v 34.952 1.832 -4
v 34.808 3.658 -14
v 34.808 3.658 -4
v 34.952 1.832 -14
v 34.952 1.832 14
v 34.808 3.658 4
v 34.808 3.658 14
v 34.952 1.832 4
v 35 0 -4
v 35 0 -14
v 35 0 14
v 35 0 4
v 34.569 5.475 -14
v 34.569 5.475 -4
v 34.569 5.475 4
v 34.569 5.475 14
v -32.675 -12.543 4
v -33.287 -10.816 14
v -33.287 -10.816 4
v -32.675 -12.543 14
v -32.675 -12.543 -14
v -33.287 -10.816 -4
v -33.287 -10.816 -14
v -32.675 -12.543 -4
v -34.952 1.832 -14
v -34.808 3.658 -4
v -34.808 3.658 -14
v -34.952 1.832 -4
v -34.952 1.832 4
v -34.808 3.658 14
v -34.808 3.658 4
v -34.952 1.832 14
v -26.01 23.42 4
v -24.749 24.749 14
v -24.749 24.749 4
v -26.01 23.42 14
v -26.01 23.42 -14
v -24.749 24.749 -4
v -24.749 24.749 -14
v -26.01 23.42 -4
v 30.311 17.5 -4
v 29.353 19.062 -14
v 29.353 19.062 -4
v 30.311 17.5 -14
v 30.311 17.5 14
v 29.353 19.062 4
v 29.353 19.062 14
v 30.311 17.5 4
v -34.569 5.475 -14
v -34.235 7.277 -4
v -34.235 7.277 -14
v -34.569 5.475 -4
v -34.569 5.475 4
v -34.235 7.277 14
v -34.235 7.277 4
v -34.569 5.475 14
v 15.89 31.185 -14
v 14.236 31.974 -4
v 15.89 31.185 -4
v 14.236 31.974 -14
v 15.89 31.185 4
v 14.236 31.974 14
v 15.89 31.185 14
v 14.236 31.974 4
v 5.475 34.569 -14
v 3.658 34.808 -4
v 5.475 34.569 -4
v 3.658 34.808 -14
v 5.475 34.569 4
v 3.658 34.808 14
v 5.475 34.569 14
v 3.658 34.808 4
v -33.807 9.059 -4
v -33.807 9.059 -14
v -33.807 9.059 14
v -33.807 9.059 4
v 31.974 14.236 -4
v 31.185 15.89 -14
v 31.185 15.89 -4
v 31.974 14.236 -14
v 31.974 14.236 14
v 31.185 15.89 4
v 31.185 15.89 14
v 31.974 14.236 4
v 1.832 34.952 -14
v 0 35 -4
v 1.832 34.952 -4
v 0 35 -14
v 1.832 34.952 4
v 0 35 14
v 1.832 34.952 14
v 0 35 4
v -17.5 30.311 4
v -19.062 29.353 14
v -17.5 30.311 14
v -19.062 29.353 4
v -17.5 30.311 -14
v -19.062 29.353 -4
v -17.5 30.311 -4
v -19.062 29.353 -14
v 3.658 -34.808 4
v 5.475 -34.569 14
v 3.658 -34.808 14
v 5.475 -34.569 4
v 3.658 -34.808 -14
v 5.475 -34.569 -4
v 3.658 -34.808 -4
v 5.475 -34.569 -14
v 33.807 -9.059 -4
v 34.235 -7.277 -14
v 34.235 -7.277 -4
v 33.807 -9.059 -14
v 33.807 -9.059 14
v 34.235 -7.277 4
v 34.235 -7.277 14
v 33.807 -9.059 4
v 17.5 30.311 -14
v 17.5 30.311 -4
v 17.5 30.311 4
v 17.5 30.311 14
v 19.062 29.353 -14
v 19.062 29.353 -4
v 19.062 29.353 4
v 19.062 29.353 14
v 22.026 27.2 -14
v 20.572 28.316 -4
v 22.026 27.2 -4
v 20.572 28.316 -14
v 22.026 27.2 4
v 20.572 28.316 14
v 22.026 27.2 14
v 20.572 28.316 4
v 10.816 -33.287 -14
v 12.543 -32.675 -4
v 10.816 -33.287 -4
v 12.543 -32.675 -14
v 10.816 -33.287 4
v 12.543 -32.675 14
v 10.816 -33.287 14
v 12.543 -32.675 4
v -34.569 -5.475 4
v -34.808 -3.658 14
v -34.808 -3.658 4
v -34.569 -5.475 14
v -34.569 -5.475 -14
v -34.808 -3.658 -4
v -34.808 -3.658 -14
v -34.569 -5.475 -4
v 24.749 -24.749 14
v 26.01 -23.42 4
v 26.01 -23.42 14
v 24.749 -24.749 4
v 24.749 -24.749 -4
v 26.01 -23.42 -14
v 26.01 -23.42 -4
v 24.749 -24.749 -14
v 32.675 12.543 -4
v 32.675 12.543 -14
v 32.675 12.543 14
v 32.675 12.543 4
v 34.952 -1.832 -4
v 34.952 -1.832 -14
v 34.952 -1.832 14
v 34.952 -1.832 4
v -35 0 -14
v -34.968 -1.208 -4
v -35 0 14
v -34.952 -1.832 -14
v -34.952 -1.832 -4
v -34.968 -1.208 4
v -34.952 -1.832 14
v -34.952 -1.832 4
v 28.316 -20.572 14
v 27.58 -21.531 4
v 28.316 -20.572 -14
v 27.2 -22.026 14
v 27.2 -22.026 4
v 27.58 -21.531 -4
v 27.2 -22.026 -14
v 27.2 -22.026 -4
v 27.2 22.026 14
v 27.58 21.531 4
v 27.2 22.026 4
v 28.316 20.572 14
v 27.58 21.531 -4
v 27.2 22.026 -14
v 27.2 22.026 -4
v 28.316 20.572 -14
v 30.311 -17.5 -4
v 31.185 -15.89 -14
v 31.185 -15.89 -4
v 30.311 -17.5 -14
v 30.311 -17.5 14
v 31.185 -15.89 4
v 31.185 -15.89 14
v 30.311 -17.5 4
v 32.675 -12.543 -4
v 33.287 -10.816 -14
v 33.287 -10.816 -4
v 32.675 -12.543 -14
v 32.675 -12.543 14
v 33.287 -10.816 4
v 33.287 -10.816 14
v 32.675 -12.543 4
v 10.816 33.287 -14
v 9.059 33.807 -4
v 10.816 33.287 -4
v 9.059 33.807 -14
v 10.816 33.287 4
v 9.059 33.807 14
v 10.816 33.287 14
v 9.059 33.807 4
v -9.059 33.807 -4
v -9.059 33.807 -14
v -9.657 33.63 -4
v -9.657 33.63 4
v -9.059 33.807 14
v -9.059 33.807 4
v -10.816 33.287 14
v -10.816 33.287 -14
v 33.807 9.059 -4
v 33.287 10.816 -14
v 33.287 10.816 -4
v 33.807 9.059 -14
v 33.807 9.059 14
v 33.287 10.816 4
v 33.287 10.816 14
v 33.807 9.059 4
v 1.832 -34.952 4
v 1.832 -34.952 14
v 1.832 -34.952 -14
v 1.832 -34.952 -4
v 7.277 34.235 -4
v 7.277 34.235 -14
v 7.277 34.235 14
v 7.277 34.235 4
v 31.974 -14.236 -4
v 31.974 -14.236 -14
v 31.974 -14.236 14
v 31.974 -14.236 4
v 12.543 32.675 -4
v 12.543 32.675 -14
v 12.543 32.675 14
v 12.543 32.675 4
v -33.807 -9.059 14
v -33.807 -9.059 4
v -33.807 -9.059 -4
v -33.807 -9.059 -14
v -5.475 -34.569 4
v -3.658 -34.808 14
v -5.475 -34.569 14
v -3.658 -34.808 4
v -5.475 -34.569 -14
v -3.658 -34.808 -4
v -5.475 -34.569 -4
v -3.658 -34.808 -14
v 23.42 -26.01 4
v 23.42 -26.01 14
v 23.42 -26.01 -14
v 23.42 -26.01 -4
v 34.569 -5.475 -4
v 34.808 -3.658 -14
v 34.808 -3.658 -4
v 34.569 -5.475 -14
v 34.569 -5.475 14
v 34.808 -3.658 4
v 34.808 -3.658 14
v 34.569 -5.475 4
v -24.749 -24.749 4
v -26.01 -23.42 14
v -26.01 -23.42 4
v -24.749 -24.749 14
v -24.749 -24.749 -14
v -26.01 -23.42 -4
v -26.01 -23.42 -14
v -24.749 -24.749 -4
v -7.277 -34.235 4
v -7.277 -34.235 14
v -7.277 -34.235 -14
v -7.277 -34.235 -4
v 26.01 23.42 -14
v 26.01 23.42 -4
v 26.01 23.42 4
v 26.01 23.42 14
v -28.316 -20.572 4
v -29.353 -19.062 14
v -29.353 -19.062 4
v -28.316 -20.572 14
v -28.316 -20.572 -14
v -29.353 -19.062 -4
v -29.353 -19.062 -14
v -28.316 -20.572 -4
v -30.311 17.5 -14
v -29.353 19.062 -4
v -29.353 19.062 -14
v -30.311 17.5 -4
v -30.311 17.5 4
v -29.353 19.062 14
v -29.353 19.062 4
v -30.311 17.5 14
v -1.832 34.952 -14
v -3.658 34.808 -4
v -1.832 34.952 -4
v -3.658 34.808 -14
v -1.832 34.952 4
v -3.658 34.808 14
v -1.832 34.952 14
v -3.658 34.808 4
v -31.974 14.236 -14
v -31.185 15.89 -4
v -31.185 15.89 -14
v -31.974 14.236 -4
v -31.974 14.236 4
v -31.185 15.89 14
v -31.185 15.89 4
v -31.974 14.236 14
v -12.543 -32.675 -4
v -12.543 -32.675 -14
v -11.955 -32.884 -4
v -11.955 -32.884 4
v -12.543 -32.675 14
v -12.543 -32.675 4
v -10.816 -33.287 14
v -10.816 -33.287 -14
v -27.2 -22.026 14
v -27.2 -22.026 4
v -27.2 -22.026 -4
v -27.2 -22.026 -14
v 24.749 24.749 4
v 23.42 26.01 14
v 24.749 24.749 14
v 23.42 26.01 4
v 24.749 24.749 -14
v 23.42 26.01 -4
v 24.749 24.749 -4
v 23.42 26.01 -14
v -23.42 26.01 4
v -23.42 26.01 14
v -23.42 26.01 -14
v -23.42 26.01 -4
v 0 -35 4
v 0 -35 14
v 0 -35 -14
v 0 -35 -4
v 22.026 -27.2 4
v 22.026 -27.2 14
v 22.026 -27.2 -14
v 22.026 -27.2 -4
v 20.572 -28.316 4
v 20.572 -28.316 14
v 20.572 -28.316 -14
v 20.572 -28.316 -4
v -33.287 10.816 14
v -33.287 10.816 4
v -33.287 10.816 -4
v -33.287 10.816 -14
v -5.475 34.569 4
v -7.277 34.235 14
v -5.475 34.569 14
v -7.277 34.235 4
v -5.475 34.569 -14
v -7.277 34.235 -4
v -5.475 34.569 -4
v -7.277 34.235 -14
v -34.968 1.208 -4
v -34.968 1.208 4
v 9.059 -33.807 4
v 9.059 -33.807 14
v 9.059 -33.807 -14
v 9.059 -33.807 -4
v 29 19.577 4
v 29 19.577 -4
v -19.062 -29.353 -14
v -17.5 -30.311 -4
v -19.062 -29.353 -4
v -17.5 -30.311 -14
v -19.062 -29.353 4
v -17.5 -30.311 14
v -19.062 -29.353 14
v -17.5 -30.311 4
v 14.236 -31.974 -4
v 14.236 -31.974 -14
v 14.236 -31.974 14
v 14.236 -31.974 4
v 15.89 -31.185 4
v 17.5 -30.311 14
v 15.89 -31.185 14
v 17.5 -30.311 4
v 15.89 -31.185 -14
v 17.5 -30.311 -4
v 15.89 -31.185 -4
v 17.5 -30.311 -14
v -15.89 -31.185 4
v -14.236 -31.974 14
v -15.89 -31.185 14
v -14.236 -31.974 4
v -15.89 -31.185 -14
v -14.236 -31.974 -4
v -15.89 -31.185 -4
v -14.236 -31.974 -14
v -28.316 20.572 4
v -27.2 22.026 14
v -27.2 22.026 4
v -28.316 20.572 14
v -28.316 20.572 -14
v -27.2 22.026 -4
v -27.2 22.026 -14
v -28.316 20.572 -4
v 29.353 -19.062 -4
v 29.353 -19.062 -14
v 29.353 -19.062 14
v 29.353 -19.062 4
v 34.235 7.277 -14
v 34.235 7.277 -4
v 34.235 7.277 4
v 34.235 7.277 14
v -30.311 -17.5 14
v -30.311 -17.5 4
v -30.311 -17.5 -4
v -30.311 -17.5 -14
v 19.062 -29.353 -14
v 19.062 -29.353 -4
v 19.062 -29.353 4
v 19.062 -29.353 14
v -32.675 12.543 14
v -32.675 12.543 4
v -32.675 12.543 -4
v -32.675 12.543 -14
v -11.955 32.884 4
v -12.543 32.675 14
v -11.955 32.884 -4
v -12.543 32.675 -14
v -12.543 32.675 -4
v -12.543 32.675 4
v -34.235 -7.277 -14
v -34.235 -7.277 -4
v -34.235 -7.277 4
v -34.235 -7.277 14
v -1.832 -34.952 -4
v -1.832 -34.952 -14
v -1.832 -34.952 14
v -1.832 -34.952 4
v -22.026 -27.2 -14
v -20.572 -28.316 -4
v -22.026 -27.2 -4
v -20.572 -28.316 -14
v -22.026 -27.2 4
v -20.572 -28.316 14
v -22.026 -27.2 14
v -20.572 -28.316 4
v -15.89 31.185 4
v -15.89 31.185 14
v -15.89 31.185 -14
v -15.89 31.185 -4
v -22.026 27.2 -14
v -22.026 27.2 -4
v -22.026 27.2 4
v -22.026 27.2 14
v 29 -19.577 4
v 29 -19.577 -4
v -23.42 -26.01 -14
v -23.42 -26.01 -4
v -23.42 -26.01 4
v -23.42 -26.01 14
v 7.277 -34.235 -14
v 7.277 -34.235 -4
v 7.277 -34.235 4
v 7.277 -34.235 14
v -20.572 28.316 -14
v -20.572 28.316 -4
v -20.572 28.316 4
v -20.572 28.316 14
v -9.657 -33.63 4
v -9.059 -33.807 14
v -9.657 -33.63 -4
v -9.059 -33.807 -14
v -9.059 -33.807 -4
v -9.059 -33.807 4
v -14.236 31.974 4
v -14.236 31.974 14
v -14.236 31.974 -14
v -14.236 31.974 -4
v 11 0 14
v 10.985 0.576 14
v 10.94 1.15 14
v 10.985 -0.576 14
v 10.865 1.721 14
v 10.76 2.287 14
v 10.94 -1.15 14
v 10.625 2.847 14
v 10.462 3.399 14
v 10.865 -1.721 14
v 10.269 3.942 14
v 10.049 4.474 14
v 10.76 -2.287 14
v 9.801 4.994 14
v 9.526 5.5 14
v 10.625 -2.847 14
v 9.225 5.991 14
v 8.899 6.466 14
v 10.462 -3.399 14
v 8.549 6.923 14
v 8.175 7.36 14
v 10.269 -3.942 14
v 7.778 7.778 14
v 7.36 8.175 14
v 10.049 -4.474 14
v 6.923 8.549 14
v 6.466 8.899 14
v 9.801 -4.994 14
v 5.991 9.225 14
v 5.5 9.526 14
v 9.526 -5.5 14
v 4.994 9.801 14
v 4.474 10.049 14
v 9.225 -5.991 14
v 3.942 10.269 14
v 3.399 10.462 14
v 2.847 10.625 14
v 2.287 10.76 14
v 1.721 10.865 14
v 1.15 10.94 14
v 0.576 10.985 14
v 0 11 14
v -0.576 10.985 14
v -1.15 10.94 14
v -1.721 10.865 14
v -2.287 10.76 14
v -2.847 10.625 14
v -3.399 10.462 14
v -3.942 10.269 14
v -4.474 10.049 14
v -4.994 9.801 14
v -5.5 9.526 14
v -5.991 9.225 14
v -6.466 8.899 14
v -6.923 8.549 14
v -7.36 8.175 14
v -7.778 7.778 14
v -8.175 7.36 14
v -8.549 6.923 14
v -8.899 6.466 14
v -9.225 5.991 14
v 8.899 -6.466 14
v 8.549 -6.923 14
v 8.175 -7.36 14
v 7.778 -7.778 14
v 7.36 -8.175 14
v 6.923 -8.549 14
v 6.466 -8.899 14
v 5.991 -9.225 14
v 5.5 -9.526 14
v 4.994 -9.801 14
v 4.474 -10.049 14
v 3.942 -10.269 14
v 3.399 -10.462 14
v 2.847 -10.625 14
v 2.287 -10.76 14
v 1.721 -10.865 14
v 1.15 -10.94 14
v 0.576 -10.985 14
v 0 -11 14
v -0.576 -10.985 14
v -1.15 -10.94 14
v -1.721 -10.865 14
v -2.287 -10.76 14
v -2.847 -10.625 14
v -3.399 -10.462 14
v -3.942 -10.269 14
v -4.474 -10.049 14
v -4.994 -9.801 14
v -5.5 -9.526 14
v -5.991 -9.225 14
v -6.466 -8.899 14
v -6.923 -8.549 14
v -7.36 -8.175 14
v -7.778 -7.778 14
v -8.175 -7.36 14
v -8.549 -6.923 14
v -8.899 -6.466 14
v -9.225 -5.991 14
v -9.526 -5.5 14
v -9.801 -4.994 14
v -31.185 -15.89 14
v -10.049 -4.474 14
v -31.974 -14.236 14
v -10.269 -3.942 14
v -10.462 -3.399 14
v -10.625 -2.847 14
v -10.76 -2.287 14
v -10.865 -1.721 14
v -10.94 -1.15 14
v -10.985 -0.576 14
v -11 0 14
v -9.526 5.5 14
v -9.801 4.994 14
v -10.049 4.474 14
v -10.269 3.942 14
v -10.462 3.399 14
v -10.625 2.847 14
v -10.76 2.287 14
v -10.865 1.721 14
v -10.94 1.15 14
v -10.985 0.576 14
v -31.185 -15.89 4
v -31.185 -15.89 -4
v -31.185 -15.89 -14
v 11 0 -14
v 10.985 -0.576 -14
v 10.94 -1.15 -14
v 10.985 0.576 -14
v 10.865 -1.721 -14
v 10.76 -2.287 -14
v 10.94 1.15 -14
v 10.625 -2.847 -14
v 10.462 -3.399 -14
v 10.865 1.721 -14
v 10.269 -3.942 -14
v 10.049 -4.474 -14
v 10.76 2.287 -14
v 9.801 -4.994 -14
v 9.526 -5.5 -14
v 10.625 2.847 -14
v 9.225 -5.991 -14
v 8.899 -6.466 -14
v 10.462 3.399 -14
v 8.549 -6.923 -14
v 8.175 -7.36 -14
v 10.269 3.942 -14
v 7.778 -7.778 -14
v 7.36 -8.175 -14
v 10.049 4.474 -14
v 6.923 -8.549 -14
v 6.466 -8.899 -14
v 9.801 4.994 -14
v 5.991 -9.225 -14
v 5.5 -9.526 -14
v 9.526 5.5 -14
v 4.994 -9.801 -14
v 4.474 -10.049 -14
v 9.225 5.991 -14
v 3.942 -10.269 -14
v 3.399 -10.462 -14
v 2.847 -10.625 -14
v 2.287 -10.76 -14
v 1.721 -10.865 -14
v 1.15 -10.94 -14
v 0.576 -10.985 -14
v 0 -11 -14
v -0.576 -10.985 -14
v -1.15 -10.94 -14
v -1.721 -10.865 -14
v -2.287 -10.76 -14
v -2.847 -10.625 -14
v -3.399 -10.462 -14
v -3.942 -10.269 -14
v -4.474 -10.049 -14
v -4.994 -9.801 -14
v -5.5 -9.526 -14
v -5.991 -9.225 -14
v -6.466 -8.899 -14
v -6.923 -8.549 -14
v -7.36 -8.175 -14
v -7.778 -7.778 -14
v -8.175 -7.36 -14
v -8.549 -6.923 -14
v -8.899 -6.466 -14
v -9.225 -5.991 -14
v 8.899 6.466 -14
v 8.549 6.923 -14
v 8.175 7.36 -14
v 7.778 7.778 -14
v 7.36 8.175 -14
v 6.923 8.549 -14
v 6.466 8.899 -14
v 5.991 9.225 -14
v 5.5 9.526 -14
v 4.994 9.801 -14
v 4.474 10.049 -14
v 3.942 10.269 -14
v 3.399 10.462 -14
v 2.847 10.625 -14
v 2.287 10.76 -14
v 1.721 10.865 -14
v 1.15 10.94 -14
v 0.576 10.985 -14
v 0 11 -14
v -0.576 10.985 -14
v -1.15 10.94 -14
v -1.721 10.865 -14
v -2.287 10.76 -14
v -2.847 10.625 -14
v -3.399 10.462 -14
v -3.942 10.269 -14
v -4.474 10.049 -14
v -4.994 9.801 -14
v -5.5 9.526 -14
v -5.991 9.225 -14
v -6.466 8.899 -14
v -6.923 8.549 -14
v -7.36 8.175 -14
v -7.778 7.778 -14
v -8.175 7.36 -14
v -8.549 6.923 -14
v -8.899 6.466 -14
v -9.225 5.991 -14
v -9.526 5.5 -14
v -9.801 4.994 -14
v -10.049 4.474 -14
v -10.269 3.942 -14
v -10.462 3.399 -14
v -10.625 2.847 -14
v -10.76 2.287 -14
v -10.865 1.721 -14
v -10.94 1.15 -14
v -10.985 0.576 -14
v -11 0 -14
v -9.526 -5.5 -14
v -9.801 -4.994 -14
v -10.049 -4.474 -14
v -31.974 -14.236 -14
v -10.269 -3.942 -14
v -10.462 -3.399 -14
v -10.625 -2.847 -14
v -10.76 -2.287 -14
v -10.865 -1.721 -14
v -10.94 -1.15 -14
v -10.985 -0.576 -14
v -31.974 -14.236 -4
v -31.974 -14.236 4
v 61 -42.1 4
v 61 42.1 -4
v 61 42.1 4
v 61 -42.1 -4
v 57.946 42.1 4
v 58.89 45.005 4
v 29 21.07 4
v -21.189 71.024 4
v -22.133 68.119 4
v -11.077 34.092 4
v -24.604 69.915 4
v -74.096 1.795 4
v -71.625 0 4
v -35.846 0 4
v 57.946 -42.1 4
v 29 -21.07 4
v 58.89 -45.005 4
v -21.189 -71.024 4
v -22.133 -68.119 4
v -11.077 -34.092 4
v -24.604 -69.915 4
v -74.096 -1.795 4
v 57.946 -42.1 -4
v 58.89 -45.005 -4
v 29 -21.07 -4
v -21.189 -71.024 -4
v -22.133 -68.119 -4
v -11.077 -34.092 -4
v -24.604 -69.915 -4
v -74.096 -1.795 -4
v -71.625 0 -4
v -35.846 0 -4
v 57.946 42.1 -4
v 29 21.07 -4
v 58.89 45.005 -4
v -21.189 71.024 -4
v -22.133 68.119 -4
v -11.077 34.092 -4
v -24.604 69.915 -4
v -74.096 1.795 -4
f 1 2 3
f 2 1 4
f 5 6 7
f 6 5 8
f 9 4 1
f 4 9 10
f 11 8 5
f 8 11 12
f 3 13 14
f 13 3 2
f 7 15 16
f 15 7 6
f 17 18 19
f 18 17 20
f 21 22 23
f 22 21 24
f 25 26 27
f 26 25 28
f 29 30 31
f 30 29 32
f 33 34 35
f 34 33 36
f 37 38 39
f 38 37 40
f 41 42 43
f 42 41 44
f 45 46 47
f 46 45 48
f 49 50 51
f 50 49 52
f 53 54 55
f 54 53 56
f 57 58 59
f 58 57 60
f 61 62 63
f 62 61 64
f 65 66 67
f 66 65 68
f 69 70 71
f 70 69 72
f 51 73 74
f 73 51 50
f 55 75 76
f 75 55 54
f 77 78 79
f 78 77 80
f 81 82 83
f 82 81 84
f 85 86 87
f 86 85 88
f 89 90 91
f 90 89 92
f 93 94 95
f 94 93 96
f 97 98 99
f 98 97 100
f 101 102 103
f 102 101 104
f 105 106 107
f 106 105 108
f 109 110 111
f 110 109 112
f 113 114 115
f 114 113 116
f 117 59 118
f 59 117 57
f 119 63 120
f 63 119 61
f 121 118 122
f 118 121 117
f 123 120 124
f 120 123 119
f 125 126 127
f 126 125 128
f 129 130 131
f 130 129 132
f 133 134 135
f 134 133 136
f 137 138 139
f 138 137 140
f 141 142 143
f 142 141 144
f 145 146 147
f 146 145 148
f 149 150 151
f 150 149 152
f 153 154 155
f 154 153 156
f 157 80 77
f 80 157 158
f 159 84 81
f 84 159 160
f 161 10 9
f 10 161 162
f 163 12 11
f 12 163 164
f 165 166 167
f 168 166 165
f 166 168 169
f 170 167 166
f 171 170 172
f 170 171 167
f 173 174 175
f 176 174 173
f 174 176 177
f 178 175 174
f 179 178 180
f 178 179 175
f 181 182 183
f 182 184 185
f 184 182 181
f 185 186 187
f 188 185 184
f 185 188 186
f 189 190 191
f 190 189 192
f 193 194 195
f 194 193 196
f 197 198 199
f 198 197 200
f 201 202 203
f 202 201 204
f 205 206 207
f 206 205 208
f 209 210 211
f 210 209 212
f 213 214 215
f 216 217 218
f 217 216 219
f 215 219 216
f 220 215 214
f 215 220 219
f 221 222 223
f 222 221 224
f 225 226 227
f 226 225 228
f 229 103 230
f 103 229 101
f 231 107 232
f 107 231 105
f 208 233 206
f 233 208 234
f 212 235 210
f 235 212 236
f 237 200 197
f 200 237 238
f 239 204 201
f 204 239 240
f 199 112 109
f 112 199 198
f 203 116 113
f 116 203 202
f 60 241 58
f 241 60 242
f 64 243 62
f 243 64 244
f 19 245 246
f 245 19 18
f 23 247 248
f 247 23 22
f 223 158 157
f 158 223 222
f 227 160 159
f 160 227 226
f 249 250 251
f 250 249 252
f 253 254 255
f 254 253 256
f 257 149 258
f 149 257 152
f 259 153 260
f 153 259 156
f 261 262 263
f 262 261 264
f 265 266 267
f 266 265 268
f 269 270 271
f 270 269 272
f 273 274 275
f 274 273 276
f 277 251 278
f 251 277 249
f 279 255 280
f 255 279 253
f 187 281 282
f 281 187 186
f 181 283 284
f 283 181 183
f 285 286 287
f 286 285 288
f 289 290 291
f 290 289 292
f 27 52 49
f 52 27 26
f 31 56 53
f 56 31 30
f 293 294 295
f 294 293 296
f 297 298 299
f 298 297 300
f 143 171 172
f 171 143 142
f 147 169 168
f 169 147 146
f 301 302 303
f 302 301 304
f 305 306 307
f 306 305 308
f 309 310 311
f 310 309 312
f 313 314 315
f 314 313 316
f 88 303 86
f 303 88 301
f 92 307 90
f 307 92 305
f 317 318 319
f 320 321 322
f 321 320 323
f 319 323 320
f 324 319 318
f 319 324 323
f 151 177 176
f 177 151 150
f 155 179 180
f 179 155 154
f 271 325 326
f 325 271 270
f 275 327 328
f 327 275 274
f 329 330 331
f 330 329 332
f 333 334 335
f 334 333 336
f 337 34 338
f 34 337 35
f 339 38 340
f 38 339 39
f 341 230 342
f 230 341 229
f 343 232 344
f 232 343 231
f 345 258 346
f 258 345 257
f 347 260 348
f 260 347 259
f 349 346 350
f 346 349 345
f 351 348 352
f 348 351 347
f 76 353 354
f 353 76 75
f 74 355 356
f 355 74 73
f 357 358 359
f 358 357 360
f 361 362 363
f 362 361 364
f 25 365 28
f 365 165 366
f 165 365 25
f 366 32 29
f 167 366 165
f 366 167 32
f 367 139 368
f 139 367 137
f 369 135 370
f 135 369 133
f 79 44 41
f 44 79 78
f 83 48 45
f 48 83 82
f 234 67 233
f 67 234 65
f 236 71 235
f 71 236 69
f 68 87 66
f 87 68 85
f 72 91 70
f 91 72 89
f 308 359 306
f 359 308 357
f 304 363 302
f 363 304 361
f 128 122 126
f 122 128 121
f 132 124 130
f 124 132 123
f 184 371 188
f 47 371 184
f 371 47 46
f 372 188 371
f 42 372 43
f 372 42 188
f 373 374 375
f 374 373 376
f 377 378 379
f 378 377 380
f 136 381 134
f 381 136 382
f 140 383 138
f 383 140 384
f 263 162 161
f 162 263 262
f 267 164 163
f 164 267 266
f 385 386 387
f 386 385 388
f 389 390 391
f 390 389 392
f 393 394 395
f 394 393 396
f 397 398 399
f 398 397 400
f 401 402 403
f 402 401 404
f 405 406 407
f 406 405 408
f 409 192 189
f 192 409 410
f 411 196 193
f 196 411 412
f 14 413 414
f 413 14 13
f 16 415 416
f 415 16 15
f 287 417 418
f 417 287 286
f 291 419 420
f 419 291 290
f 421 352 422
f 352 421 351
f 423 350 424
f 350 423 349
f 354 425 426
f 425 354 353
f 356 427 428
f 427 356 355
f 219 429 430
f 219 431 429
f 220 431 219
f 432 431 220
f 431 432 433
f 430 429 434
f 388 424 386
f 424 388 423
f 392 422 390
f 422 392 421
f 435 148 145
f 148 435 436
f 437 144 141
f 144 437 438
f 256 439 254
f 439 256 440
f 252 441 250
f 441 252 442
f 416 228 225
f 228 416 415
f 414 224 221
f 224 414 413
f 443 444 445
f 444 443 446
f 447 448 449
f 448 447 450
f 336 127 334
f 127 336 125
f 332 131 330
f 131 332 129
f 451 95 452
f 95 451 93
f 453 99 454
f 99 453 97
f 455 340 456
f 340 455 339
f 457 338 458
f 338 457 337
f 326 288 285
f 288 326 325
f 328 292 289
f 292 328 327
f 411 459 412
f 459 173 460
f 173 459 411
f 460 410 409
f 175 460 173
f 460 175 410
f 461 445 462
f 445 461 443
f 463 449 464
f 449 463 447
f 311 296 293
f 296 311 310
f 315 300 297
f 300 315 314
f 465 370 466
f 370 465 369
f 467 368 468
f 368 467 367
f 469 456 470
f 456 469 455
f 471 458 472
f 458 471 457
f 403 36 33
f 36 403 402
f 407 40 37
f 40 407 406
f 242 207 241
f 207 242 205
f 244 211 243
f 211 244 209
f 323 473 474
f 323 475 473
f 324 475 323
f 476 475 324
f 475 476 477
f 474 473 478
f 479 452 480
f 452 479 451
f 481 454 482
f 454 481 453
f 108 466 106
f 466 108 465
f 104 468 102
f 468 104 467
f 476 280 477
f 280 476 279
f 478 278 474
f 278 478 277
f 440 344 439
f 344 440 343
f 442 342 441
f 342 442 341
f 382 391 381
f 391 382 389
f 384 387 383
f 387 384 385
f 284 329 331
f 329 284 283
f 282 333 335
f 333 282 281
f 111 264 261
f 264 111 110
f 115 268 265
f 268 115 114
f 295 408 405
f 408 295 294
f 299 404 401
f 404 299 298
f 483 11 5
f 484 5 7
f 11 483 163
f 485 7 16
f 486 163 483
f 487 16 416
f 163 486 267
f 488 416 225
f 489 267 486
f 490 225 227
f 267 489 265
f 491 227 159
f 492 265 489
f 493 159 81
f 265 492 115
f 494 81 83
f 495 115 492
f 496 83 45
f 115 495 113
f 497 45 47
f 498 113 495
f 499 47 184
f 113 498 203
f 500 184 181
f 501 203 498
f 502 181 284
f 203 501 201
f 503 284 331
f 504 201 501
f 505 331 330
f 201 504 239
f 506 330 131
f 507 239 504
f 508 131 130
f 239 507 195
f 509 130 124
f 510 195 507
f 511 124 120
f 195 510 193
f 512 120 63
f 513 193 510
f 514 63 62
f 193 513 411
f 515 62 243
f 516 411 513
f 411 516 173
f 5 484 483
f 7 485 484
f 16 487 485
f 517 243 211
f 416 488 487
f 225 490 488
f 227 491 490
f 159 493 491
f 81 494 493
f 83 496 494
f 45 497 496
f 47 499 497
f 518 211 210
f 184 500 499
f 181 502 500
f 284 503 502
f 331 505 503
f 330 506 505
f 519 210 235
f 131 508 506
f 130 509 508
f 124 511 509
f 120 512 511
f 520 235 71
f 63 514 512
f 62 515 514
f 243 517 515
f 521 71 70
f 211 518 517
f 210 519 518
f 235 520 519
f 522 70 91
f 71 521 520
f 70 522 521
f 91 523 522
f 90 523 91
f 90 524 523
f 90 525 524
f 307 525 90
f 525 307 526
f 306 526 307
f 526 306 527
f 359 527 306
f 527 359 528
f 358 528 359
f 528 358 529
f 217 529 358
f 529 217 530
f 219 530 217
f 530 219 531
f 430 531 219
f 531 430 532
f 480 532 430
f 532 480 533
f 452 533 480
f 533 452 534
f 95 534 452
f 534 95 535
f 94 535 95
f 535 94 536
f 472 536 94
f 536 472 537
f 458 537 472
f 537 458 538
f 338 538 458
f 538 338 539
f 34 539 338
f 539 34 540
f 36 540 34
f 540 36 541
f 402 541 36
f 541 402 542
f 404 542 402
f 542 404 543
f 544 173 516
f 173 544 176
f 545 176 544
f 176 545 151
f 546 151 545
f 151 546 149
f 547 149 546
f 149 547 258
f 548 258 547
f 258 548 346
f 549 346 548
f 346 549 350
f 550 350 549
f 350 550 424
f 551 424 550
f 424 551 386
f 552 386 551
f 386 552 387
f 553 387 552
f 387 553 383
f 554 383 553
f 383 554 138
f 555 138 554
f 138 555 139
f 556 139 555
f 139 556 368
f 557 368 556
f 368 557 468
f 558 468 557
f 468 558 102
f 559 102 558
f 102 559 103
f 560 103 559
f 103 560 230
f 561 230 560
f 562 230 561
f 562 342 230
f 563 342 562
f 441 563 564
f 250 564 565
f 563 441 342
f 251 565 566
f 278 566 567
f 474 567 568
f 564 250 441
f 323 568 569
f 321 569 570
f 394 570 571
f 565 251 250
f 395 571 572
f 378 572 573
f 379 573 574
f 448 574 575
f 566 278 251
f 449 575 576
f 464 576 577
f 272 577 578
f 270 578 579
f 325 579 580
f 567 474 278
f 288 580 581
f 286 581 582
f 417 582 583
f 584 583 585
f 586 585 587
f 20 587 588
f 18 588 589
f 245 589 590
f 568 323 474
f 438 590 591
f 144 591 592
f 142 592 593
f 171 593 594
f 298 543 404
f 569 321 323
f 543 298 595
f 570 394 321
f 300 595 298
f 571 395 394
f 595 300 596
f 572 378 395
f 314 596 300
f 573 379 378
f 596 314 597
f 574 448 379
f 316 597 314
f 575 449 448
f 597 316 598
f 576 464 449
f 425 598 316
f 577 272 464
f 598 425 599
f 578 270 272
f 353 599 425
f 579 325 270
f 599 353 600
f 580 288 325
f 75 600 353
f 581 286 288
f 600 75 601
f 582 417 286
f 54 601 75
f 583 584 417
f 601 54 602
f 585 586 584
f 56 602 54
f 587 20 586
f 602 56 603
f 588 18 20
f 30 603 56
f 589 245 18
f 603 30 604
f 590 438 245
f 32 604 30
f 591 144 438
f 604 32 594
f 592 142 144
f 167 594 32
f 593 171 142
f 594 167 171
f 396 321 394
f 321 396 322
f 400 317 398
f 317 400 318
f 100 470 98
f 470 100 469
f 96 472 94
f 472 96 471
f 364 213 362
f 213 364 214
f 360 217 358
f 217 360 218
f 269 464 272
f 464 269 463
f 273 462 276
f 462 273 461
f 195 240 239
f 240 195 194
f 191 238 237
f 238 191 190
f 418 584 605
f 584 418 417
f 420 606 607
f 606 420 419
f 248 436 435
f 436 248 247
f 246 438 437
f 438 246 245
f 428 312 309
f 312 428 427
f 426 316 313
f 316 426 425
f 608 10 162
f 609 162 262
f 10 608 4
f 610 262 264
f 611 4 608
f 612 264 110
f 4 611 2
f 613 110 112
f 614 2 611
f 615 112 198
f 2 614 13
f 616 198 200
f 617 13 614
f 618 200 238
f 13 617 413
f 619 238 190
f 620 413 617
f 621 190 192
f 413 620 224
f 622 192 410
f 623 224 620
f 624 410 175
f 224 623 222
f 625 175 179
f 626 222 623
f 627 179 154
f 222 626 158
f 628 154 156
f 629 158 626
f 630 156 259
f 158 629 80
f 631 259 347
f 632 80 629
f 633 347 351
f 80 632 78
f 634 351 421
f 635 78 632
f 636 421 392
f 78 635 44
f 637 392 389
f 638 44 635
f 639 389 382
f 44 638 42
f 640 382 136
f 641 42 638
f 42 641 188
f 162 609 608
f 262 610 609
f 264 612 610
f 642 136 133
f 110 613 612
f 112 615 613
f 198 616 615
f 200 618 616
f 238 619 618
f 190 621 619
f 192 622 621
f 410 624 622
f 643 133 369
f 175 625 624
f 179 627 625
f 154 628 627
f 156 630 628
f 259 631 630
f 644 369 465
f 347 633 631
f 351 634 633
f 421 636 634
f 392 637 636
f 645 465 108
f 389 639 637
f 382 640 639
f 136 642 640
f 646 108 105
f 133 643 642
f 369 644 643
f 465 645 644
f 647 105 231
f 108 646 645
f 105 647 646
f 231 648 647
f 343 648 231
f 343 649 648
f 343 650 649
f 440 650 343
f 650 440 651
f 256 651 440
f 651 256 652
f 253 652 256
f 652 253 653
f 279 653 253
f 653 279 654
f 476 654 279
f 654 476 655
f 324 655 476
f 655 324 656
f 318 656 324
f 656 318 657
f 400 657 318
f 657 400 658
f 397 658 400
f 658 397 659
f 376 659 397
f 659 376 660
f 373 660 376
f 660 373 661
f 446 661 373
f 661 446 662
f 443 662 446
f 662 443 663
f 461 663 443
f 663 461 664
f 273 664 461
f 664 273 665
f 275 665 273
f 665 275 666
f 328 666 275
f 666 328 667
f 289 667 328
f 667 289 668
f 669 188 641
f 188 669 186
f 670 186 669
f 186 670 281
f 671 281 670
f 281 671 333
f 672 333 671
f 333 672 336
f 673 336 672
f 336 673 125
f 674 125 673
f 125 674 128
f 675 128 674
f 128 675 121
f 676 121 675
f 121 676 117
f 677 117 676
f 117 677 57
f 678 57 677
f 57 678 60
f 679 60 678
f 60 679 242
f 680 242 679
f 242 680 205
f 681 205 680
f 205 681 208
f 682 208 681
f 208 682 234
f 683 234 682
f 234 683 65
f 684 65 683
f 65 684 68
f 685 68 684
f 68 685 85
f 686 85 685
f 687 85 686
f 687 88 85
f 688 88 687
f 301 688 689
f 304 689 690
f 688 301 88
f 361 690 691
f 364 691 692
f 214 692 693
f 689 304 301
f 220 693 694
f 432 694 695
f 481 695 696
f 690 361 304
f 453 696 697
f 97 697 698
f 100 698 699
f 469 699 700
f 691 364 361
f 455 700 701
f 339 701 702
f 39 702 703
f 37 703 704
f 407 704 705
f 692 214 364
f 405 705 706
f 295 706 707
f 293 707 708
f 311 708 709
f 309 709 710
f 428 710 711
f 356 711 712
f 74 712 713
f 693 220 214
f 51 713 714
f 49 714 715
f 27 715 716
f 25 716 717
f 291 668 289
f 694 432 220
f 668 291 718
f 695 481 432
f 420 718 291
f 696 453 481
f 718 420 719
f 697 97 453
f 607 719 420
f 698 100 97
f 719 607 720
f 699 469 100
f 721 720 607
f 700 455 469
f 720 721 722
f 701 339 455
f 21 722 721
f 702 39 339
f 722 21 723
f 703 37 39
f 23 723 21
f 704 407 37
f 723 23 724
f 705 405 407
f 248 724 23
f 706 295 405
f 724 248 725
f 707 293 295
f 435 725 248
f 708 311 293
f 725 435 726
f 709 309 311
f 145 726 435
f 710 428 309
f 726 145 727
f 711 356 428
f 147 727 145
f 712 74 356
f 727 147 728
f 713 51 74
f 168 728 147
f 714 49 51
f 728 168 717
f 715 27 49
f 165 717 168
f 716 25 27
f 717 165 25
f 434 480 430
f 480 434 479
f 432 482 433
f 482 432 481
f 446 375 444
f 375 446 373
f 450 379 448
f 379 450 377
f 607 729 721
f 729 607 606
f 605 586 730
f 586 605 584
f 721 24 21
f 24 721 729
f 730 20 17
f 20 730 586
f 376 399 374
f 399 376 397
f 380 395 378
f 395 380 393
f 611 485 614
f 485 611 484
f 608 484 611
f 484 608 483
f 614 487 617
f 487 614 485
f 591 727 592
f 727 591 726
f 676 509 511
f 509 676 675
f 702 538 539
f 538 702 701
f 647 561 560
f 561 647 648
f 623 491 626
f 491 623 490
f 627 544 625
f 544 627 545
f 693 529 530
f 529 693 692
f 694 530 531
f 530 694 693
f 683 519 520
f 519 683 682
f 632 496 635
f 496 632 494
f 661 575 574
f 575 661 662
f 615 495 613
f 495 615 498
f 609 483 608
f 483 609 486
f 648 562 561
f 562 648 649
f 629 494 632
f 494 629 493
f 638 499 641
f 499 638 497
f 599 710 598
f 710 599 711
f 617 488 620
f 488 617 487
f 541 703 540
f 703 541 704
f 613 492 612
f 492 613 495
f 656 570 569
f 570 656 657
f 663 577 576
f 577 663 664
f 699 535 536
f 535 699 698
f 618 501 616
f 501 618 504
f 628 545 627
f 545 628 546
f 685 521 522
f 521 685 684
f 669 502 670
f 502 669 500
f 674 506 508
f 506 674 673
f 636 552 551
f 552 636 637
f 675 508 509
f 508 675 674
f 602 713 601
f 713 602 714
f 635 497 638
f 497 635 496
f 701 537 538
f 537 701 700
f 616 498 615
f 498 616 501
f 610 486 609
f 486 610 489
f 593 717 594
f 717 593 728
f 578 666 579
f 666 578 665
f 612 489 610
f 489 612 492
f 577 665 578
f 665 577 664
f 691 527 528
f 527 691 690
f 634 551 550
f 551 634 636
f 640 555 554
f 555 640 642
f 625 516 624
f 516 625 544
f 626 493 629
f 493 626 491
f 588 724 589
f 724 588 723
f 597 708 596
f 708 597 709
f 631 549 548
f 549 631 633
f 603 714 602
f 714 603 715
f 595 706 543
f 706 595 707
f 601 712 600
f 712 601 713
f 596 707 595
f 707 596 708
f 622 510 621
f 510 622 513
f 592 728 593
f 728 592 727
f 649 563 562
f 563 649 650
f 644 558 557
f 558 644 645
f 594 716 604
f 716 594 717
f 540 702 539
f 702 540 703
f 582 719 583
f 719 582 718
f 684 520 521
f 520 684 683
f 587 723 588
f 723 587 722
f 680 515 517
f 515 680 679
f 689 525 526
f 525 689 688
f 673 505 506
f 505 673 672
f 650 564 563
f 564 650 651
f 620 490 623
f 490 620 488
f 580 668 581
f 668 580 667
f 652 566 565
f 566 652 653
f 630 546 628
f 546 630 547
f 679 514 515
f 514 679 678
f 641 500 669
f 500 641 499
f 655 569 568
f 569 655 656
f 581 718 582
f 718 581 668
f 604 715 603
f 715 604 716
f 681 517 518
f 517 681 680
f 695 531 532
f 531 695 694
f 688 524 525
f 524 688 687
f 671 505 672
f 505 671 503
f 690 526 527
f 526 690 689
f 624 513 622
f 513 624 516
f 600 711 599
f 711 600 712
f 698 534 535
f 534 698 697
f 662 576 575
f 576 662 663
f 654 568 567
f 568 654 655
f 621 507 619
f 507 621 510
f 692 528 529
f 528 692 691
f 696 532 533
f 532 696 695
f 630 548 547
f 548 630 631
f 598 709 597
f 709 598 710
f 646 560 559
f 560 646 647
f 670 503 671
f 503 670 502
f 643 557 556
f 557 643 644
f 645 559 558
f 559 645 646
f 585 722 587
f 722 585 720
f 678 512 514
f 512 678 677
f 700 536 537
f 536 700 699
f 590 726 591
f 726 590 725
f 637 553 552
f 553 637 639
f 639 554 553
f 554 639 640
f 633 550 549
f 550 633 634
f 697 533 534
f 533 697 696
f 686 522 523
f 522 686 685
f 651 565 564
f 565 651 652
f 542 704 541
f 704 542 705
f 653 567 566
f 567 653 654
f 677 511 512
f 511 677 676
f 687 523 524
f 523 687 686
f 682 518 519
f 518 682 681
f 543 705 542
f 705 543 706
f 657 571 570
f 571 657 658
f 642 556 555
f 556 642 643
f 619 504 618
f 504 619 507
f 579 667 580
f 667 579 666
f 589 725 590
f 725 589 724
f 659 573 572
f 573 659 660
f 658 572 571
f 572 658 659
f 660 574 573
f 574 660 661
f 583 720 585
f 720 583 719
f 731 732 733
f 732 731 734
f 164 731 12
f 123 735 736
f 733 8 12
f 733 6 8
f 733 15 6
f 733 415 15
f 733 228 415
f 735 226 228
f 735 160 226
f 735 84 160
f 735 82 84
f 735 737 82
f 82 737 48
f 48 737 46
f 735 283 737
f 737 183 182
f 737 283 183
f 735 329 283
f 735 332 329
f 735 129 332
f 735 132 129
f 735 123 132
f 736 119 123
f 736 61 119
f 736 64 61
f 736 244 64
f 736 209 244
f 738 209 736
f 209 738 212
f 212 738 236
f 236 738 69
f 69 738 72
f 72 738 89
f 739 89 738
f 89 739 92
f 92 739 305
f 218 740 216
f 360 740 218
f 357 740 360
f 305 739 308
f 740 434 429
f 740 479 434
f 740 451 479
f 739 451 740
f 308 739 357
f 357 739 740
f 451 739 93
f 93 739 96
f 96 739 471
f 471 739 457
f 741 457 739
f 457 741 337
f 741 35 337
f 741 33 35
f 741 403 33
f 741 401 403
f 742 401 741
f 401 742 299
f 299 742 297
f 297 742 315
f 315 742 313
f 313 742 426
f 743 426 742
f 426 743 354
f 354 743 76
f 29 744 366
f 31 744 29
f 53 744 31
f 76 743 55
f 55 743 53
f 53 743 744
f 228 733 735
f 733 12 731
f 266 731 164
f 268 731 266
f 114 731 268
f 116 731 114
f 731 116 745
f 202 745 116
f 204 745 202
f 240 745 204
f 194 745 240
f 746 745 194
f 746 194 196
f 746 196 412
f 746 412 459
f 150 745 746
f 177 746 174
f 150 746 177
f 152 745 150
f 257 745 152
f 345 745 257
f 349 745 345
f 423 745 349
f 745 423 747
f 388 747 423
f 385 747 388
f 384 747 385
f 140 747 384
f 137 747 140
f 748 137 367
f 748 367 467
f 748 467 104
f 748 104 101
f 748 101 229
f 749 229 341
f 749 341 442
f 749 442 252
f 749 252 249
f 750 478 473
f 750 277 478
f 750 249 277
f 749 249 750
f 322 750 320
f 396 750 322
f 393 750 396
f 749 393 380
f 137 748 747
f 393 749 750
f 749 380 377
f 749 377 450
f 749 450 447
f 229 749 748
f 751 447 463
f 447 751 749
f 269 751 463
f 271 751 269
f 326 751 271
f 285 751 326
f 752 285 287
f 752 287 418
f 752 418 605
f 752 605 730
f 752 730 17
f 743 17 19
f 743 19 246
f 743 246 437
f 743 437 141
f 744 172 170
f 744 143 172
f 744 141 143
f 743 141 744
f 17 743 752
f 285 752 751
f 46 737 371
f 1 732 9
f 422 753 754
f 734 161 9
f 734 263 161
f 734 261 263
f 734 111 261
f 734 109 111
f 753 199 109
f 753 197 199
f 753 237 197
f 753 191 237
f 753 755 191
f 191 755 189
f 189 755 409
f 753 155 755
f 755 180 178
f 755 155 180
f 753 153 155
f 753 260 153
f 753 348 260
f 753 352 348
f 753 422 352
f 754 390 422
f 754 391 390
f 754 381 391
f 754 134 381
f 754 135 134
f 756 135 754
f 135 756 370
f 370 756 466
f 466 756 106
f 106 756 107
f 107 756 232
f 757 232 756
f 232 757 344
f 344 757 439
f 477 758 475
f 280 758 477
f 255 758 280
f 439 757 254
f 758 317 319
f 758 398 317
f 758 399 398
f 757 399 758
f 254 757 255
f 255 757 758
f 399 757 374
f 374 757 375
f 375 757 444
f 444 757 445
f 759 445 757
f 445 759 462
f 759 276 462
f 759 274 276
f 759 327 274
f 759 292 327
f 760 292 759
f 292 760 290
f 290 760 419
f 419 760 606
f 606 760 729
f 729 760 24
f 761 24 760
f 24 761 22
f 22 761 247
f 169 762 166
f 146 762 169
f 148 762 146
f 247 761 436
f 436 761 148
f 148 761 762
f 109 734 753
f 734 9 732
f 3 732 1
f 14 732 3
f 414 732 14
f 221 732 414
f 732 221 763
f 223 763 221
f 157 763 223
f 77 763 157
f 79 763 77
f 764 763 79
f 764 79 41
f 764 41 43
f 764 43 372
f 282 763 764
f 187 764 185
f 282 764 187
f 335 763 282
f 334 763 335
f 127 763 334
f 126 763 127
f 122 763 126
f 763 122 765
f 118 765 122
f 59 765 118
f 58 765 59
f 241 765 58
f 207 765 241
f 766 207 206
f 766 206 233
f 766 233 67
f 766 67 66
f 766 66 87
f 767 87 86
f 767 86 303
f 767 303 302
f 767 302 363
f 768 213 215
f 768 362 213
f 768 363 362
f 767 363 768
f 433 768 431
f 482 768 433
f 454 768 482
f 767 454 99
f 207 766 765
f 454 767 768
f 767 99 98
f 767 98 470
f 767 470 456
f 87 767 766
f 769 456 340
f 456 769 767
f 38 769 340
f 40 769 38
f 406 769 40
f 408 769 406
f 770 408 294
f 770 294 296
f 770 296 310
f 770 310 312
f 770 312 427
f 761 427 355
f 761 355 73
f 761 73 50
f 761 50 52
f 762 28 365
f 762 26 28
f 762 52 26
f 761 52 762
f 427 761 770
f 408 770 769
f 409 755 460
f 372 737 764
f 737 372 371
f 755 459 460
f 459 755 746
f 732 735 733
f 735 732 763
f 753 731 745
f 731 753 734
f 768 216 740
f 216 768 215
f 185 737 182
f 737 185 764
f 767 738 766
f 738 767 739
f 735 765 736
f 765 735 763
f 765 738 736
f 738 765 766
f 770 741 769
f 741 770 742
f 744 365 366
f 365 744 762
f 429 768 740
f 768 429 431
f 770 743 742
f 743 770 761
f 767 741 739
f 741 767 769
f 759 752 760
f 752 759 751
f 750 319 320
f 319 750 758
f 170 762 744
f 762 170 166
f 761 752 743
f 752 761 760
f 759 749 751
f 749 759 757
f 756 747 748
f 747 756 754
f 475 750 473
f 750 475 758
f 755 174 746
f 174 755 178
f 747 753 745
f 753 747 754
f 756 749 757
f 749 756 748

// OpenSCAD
// ====================================================================================
// REVOLUTIONARY TECHNOLOGY COMPANY & UNIVERSITY OF WASHINGTON DEPARTMENT OF PHYSICS
// Subsystem: silverado_md_restraints.scad (Tactical Harness & Worker Anchors)
// Core Application: 2027-2028 Silverado MD 5-Point Cam Buckles & Fall-Protection D-Rings
// Center Origin (0,0,0) = Geometric Centerpoint of the Central Cam-Lock Release Hub
// ====================================================================================

$fn = 120; // High-fidelity CNC machining and forging resolution

// --- Restraint System Selector ---
// 1 = Tactical 5-Point Racing Harness, 2 = Heavy Industrial Worker Fall-Protection Shackle
RESTRAINT_SYSTEM_MODE = 1;

// --- Geometric Component Constants (mm) ---
inch_to_mm         = 25.4;
cam_buckle_dia     = 70.00;            // Magnesium center rotary release knob
webbing_width      = 3.0 * inch_to_mm; // 76.2 mm aviation-strength shoulder belts
d_ring_inner_dia   = 50.00;            // Industrial OSHA-compliant harness latch hoop
plate_thickness    = 12.50;            // 1/2" Thick anchor foot matching cabin armor [INDEX]

module central_rotary_cam_lock() {
    echo(str("COMPILING SILVERADO MD PASSENGER RESTRAINTS: ", (RESTRAINT_SYSTEM_MODE == 1) ? "5_POINT_TACTICAL_CAM_HARNESS" : "INDUSTRIAL_FALL_PROTECTION_SHACKLE"));
    if (RESTRAINT_SYSTEM_MODE == 1) {
        color("Silver") {
            difference() {
                // Main circular buckle block
                cylinder(d=cam_buckle_dia, h=28, center=true);
                // Center-reamed structural latch release mechanism pin
                cylinder(d=22.0, h=32, center=true);
            }
        }
        // 5x Radially flanged seat belt buckle tongue inserts slipping into center hub
        color("Black") {
            for (a = [0 : 72 : 288]) {
                rotate([0, 0, a])
                    translate([cam_buckle_dia/2 + 10, 0, 0])
                        cube([32, webbing_width + 8, 8], center=true);
            }
        }
    }
}

module industrial_worker_dring_anchor() {
    // Forged heavy-tonnage lanyard shackle anchoring straight into the Titanium B-pillars [INDEX]
    if (RESTRAINT_SYSTEM_MODE == 2) {
        // Base plate mating flush onto the 12.5mm armored cab wall skeleton [INDEX]
        color("DimGrey") {
            translate([0, 0, -plate_thickness/2])
                difference() {
                    cube([120, 80, plate_thickness], center=true);
                    // Dual Grade 12.9 high-tensile frame attachment borehole ports [INDEX]
                    translate([-35, 0, 0]) cylinder(d=14.5, h=25, center=true);
                    translate([35, 0, 0])  cylinder(d=14.5, h=25, center=true);
                }
        }
        // Forged D-Ring loop projecting out into the cabin workspace for lanyard clipping
        color("Silver") {
            translate([0, 0, d_ring_inner_dia/2])
                rotate([90, 0, 0])
                    difference() {
                        cylinder(d=d_ring_inner_dia + 24, h=22, center=true);
                        cylinder(d=d_ring_inner_dia, h=26, center=true); // Clear attachment eyelet
                    }
        }
    }
}

// --- Composite Restraint System Instantiation ---
union() {
    central_rotary_cam_lock();
    industrial_worker_dring_anchor();
}
